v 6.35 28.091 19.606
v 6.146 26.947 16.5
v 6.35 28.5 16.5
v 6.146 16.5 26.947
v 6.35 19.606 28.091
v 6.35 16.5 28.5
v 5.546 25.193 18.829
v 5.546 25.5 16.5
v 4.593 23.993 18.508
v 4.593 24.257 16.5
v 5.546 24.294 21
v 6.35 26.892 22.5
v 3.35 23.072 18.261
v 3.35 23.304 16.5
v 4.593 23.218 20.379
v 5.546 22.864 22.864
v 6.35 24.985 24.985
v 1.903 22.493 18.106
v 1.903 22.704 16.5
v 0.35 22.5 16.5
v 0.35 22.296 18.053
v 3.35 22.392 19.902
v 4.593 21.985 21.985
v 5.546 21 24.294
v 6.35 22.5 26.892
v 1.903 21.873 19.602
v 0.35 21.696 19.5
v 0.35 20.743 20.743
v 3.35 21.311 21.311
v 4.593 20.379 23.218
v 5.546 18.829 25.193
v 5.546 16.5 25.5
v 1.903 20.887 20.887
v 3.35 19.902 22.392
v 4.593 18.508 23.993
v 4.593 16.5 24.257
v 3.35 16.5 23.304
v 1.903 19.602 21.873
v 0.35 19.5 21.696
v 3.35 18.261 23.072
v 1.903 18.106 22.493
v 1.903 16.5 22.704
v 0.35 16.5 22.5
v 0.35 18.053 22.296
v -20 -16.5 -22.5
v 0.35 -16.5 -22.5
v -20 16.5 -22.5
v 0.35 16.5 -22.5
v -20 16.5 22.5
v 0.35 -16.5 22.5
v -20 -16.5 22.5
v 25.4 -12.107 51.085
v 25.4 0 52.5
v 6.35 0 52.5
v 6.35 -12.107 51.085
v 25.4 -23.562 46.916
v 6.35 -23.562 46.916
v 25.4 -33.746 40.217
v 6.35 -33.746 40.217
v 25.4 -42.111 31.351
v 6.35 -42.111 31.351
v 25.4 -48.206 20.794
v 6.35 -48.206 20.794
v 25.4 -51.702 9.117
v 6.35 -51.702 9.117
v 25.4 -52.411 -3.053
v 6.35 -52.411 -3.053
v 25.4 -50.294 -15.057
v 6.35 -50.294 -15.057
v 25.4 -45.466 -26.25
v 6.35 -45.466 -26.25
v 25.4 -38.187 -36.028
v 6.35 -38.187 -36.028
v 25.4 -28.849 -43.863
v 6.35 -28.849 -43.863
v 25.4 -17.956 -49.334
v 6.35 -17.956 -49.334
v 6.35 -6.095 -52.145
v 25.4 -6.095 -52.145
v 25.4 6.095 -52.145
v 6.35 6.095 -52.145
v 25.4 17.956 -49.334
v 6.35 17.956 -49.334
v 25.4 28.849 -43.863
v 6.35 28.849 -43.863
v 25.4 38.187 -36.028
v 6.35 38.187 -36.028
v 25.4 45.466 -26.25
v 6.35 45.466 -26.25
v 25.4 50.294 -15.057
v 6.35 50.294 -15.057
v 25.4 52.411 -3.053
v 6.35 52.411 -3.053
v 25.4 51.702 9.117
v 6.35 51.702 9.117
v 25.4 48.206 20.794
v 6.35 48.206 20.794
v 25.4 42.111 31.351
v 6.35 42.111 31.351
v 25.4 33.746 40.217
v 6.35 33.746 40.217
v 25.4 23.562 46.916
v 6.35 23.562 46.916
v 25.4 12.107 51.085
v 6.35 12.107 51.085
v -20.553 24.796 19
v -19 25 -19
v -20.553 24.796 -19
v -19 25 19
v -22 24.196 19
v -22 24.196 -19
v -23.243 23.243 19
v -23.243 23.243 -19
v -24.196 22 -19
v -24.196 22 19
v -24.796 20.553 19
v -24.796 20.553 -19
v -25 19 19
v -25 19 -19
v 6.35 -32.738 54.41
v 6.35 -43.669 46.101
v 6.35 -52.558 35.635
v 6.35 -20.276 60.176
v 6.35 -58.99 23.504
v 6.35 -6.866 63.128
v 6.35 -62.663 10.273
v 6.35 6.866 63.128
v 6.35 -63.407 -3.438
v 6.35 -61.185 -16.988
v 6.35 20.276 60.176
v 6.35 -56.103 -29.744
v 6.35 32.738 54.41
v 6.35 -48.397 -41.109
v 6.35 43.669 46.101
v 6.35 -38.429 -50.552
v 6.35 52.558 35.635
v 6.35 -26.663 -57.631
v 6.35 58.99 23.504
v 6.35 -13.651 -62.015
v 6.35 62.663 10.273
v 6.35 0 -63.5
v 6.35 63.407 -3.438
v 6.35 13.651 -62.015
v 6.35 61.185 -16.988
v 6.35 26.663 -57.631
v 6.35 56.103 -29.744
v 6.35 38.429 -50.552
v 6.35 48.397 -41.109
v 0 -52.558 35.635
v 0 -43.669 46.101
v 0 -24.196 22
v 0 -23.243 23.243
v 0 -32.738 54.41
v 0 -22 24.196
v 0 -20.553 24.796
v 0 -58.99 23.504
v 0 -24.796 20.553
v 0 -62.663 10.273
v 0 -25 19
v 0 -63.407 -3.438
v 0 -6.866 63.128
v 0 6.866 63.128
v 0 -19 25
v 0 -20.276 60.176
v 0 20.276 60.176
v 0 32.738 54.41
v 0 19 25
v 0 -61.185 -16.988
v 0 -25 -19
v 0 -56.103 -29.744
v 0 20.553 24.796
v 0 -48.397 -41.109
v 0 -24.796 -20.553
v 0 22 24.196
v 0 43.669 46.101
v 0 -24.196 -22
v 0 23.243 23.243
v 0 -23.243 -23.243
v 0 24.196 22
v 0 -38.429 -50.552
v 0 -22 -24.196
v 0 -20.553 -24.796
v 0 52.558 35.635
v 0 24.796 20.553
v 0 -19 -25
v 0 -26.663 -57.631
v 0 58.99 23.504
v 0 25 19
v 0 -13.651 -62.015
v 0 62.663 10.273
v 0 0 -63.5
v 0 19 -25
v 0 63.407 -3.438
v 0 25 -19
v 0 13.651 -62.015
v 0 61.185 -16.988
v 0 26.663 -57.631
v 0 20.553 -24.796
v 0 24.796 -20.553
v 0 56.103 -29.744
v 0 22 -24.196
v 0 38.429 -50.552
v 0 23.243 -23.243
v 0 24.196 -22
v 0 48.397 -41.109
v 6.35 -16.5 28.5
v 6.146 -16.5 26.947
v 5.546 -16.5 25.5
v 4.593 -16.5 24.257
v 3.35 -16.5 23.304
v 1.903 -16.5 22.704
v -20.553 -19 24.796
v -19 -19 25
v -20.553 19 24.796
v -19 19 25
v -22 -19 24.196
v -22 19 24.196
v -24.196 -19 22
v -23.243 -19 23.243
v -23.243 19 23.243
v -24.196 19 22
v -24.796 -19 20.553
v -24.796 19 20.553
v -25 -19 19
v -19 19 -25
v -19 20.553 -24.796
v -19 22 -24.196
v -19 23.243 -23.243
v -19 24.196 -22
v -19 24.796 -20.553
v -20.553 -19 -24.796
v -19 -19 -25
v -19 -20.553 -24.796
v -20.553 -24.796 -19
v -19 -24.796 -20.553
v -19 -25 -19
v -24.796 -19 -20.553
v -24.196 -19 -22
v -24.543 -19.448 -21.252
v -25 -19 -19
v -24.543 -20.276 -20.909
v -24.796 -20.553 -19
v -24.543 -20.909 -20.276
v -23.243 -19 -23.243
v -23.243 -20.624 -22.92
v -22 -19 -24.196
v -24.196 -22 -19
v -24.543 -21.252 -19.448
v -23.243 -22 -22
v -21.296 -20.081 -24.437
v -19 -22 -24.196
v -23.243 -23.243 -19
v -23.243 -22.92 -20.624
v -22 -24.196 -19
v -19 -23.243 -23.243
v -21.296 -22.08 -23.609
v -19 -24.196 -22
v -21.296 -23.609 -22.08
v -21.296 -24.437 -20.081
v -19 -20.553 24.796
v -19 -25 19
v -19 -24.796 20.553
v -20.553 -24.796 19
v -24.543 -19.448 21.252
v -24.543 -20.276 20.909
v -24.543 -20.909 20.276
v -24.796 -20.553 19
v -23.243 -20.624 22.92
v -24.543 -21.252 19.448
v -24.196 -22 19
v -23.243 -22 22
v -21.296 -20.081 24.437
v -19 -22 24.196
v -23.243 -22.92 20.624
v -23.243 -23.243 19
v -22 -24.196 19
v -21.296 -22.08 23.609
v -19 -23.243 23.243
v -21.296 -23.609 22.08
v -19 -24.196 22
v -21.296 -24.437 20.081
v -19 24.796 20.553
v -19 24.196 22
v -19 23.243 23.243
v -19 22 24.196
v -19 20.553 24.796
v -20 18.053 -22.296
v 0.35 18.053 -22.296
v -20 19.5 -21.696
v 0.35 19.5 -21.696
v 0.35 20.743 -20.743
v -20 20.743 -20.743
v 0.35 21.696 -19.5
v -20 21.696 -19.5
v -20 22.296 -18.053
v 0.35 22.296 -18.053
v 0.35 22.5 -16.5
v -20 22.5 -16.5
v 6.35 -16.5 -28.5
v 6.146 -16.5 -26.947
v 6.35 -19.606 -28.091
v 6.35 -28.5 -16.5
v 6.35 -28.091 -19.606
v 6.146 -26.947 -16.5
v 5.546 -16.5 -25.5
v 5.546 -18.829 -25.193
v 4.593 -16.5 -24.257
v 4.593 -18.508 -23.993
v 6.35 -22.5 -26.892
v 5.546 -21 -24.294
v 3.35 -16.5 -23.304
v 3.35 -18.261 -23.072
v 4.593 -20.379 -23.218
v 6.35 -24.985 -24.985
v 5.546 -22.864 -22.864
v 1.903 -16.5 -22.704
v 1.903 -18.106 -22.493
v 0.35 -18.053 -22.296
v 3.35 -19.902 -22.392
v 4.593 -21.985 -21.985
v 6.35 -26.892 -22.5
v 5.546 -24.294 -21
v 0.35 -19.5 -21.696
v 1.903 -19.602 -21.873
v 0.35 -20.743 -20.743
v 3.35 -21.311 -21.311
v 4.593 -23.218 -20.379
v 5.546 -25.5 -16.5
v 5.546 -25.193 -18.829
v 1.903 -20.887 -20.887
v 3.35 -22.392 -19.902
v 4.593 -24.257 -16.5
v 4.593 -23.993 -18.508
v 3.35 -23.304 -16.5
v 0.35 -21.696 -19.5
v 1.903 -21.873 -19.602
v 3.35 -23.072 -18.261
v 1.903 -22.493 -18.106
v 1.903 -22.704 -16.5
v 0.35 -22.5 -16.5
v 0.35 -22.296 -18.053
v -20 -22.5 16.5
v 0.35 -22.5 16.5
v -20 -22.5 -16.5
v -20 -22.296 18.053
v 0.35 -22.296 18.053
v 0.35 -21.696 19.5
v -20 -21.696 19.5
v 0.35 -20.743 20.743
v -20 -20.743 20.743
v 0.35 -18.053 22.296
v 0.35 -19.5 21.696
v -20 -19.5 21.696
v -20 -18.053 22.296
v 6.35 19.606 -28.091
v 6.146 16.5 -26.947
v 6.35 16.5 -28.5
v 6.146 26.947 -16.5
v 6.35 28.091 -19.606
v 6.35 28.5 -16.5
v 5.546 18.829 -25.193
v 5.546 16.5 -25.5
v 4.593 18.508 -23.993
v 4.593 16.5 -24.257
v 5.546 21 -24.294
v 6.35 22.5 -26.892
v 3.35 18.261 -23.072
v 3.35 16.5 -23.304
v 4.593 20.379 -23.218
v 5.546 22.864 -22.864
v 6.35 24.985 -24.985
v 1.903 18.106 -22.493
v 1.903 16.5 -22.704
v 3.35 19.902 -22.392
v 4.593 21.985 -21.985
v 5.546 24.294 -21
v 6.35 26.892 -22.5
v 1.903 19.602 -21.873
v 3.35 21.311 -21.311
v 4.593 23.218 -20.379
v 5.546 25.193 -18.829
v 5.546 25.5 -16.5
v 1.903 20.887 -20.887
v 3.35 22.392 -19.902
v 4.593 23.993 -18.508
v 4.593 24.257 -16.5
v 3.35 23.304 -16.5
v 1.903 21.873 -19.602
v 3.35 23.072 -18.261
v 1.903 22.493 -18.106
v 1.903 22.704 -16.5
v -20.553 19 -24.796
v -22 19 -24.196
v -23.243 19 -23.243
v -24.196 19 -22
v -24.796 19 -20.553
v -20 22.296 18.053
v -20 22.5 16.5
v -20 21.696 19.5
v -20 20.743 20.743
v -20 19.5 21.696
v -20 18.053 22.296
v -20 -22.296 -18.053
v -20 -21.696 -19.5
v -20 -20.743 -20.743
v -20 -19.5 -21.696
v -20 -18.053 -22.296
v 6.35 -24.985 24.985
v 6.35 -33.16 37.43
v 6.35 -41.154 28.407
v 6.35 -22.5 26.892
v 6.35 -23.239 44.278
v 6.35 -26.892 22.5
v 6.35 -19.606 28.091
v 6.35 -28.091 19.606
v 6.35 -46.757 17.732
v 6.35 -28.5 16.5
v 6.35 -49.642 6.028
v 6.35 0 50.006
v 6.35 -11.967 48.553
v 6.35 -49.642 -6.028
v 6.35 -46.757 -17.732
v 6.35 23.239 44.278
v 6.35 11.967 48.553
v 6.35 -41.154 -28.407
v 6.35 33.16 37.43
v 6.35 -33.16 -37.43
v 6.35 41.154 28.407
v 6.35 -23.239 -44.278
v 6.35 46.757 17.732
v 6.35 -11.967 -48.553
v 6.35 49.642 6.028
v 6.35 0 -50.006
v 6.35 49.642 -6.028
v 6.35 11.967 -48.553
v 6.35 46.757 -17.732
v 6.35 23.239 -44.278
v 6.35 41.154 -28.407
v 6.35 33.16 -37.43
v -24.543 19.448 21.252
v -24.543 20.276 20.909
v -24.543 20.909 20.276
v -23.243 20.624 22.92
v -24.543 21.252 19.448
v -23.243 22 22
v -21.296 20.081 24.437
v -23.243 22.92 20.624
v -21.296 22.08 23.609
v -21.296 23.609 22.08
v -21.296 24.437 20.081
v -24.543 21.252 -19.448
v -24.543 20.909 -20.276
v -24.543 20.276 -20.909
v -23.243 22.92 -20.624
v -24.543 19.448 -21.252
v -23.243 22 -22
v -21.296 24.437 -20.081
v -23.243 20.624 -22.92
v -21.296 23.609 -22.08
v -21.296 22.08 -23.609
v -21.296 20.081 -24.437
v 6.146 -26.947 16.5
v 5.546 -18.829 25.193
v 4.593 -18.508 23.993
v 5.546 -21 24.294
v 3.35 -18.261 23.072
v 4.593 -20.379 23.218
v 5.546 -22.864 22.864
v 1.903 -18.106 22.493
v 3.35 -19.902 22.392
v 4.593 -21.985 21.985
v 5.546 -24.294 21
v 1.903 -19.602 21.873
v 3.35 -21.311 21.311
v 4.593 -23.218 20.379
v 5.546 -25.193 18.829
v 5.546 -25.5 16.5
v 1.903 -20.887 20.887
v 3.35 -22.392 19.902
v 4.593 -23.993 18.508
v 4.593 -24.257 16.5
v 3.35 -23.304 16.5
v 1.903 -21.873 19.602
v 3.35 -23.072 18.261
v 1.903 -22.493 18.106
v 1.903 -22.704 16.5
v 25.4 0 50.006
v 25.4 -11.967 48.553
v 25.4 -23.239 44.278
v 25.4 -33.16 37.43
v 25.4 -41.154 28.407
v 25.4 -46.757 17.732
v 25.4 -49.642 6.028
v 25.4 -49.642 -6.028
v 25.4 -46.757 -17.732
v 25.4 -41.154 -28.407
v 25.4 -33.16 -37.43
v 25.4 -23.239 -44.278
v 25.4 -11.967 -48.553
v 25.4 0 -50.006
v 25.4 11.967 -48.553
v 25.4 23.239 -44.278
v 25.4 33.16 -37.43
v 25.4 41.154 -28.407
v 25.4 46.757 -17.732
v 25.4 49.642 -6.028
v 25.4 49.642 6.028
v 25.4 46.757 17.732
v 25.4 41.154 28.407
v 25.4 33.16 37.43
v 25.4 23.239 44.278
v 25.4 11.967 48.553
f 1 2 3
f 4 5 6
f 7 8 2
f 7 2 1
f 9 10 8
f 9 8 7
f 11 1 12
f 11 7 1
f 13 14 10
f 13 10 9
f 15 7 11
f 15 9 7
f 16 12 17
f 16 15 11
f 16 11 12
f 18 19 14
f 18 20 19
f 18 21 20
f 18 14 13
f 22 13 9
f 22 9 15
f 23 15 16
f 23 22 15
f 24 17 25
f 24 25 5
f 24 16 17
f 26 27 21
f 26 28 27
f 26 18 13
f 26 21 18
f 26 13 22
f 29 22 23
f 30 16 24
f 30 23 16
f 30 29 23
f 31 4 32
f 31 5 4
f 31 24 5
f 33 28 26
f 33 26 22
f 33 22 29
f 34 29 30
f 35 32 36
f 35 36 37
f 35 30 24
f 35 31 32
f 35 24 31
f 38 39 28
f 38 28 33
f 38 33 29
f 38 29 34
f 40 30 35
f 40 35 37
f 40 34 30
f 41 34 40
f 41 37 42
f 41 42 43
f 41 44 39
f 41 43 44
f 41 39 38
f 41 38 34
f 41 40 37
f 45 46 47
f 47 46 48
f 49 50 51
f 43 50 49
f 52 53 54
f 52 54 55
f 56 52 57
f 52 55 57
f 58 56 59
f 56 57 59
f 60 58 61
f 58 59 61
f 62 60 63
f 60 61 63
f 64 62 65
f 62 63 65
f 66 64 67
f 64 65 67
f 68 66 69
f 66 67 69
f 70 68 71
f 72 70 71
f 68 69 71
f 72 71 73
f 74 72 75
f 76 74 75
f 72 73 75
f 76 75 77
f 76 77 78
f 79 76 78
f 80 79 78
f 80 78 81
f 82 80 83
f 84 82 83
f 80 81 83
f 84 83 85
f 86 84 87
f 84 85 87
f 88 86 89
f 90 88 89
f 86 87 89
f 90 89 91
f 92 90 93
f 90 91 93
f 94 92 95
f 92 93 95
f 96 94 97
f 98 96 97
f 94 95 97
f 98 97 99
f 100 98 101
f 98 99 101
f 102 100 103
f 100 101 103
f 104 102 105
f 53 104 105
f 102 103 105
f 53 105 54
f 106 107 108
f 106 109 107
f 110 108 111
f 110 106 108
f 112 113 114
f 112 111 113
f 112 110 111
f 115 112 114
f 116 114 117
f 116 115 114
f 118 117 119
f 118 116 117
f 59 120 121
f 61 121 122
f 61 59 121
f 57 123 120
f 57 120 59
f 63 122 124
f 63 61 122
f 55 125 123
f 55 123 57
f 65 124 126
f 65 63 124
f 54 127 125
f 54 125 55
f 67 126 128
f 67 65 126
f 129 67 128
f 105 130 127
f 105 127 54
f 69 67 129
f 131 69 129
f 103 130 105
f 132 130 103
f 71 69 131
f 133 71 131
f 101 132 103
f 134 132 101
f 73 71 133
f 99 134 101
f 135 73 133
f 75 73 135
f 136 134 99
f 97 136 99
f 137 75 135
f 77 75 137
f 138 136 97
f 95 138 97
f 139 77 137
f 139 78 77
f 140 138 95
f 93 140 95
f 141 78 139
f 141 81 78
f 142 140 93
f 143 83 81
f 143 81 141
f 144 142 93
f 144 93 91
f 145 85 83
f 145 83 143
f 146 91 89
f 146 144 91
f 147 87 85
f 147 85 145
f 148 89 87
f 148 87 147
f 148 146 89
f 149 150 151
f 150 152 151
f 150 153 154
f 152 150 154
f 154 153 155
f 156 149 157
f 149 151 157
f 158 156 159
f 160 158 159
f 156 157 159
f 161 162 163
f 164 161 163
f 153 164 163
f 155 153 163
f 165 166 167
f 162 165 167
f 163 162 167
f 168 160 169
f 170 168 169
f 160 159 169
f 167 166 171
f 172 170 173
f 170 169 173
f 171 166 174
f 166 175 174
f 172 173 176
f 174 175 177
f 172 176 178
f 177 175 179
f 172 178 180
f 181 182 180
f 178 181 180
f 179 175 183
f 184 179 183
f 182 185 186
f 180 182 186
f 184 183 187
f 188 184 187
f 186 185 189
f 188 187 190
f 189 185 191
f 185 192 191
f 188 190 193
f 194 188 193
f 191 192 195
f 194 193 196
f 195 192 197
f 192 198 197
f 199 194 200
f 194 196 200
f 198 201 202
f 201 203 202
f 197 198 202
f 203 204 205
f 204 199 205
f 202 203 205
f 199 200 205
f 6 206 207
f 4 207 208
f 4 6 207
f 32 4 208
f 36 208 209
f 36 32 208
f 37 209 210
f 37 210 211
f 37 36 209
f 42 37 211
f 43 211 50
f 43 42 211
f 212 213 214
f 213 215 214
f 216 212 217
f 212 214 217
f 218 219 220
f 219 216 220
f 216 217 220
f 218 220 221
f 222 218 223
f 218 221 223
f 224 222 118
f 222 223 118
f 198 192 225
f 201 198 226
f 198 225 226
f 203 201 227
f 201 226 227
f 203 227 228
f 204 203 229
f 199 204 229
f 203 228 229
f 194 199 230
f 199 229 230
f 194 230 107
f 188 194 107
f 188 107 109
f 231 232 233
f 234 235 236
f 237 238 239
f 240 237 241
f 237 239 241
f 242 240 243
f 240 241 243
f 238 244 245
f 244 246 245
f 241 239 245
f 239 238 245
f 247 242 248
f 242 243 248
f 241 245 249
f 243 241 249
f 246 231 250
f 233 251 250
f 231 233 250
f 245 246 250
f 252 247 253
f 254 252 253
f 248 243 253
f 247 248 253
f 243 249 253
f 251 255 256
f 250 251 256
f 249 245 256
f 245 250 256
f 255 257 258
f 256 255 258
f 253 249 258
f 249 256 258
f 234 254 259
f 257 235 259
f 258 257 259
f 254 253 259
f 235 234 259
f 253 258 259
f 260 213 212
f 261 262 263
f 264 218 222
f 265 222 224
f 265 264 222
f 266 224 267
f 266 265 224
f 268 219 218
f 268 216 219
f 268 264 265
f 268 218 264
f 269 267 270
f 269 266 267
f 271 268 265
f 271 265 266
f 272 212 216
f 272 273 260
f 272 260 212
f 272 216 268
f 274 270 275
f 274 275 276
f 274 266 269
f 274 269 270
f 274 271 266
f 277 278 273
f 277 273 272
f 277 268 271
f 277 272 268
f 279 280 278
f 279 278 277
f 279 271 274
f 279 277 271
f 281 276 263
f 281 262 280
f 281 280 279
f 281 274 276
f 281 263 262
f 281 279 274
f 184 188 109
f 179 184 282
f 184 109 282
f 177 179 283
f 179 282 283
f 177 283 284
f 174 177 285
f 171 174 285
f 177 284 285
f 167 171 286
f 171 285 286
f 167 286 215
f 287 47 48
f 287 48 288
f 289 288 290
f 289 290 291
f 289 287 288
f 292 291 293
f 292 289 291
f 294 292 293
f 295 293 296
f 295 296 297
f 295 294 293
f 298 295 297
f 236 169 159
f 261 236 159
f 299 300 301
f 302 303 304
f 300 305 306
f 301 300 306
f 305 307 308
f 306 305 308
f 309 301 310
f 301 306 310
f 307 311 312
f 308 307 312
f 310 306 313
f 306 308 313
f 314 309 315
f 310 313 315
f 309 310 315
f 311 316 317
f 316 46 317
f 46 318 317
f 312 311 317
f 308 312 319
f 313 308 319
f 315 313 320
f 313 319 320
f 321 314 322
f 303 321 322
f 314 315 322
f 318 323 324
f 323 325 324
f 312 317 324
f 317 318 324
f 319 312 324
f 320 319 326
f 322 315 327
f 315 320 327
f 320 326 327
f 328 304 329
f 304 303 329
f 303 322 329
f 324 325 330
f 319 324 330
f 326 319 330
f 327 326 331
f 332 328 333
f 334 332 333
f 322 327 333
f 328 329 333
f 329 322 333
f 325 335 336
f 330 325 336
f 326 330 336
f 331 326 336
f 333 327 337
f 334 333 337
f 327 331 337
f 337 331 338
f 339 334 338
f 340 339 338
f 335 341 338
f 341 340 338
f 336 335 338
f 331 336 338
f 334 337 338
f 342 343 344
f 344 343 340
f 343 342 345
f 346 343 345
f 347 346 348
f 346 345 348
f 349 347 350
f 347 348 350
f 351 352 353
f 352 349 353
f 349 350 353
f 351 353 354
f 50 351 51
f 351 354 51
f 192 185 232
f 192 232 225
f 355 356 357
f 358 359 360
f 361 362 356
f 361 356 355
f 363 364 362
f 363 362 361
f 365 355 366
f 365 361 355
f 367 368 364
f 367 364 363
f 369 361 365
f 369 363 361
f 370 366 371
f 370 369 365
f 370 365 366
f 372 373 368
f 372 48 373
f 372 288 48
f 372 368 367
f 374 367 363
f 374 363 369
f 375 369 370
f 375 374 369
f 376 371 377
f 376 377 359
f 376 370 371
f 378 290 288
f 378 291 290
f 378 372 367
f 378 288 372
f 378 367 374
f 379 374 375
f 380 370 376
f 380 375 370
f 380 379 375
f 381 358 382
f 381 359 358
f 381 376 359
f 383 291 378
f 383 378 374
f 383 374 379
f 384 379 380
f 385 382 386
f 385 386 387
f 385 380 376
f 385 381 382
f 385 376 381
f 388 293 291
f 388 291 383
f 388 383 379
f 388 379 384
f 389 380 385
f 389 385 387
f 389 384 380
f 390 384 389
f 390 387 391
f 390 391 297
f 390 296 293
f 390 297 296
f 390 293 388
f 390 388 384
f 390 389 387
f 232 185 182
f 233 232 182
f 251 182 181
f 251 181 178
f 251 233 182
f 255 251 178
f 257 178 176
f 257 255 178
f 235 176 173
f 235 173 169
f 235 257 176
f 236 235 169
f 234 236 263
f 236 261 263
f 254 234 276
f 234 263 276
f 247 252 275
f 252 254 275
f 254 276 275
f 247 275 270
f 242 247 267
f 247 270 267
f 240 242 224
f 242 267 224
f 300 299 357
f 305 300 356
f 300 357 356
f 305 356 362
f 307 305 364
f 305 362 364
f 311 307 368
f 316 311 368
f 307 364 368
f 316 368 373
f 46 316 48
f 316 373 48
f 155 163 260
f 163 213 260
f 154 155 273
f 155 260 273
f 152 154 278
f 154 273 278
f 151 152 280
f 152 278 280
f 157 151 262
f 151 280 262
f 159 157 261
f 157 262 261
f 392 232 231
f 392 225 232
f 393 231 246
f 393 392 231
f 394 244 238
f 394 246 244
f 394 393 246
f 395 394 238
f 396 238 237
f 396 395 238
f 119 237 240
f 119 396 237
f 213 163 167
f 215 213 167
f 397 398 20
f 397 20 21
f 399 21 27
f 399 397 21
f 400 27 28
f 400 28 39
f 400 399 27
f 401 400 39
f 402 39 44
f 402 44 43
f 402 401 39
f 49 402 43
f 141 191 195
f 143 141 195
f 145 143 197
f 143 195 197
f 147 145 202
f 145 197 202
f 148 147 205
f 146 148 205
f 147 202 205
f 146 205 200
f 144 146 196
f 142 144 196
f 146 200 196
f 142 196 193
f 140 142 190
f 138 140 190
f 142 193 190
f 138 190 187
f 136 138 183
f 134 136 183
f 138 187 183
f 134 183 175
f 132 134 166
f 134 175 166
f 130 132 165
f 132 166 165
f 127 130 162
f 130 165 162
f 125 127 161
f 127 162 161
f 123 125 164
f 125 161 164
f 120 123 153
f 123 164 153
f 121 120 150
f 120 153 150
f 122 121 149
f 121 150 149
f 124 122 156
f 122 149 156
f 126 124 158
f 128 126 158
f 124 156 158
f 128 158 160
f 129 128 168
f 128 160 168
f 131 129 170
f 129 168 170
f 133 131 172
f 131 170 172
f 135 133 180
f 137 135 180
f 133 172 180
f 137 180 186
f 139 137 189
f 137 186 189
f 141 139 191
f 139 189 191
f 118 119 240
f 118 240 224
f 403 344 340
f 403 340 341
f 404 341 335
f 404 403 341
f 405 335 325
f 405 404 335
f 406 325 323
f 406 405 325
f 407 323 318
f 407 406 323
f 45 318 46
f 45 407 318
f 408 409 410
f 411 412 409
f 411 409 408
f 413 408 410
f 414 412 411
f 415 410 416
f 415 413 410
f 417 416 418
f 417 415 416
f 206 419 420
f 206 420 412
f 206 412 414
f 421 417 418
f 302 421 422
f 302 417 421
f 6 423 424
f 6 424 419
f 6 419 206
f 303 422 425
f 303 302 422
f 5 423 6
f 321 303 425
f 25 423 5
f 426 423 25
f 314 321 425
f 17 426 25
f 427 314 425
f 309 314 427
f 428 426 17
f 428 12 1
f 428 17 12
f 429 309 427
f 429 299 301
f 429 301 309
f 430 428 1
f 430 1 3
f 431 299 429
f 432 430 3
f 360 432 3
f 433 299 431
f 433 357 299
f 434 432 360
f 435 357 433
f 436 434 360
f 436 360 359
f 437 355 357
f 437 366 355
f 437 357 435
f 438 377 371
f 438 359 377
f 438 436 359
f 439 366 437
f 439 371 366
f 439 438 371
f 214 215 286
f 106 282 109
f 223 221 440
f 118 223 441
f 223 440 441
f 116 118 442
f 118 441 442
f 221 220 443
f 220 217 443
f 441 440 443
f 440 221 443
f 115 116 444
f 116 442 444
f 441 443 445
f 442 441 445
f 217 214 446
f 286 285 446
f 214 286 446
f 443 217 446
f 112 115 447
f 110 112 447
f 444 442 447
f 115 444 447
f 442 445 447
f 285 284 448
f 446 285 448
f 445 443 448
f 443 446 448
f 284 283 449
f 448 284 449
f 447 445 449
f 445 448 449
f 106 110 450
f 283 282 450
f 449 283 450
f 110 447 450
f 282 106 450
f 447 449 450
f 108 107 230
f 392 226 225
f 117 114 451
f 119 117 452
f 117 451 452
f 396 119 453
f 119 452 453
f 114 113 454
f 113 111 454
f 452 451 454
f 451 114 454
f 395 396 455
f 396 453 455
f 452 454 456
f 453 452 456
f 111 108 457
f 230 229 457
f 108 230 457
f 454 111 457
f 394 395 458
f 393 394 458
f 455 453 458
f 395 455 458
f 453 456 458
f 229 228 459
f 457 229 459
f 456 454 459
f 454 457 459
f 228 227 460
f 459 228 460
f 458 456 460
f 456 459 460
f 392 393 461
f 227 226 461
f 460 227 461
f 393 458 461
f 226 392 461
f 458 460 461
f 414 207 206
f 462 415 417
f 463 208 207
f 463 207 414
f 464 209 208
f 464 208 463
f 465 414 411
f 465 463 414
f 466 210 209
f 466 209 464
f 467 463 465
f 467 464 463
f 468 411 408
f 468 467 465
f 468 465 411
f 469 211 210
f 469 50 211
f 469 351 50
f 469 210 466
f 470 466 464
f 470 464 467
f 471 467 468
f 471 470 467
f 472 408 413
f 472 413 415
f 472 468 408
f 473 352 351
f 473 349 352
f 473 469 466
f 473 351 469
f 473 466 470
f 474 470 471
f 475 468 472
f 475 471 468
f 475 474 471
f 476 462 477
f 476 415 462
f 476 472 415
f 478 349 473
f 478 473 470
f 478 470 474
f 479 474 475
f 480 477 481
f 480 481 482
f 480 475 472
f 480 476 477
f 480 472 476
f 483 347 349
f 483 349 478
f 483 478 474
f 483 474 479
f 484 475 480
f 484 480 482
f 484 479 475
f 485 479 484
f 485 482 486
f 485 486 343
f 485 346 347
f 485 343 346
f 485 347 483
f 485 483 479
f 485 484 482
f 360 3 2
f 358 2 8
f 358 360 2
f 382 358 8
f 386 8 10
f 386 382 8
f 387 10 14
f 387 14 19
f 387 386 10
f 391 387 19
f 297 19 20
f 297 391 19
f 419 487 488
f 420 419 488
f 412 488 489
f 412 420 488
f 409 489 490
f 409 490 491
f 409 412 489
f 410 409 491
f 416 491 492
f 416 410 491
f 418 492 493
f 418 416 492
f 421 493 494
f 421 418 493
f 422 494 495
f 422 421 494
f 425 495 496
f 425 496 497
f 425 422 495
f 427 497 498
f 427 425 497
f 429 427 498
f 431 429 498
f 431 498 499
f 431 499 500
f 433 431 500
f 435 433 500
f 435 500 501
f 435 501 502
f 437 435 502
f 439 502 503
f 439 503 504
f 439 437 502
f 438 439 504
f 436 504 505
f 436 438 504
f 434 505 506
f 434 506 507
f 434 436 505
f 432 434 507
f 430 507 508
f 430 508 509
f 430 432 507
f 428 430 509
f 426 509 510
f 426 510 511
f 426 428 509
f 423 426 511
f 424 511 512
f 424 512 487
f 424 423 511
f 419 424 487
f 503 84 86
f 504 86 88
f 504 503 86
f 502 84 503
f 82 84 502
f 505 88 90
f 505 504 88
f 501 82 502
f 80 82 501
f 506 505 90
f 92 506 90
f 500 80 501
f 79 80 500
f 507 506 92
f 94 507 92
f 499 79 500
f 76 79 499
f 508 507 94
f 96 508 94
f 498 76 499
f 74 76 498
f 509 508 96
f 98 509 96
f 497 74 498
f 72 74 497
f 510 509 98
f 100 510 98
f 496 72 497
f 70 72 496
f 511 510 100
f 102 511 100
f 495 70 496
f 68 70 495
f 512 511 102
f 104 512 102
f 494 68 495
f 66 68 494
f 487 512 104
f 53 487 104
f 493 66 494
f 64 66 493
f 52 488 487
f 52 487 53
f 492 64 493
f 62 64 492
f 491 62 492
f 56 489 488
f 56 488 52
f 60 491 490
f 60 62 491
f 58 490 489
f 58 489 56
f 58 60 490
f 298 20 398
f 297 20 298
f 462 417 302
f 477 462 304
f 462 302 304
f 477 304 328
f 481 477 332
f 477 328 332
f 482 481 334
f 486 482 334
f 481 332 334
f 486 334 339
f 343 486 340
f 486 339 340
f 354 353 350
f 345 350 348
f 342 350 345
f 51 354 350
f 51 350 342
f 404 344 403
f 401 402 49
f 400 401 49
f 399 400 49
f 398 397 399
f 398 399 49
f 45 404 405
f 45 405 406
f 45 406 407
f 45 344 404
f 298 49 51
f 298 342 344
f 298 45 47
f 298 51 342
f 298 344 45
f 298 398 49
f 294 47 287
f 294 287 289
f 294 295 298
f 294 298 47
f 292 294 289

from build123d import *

# Parameters (mm, degrees)
SKETCH1_R           = 63.5
BOSS_EXTRUDE1_DEPTH = 6.35
SKETCH2_R           = 52.5
SKETCH2_R_2         = 50.00625
BOSS_EXTRUDE2_DEPTH = 19.05
SKETCH3_W           = 50
SKETCH3_H           = 50
BOSS_EXTRUDE3_DEPTH = 25
SKETCH4_W           = 45
SKETCH4_H           = 45
CUT_EXTRUDE1_DEPTH  = 26.35
FILLET1_R           = 6


with BuildPart() as part:
    # Sketch1 → Boss-Extrude1 (new body)
    with BuildSketch(Plane(origin=(0, 0, 0), x_dir=(0, 0, -1), z_dir=(1, 0, 0))):
        Circle(SKETCH1_R)
    extrude(amount=BOSS_EXTRUDE1_DEPTH)

    # Sketch2 → Boss-Extrude2 (add)
    with BuildSketch(Plane(origin=(6.35, 0, 0), x_dir=(0, 0, -1), z_dir=(1, 0, 0))):
        with Locations(Location((0, 0, 0), (0, 0, 180))):
            Circle(SKETCH2_R)
        with Locations(Location((0, 0, 0), (0, 0, 180))):
            Circle(SKETCH2_R_2, mode=Mode.SUBTRACT)
    extrude(amount=BOSS_EXTRUDE2_DEPTH)

    # Sketch3 → Boss-Extrude3 (add)
    with BuildSketch(Plane.ZY):
        Rectangle(SKETCH3_W, SKETCH3_H)
    extrude(amount=BOSS_EXTRUDE3_DEPTH)

    # Sketch4 → Cut-Extrude1 (cut)
    with BuildSketch(Plane(origin=(6.35, 0, 0), x_dir=(0, 0, -1), z_dir=(1, 0, 0))):
        Rectangle(SKETCH4_W, SKETCH4_H)
    extrude(amount=-CUT_EXTRUDE1_DEPTH, mode=Mode.SUBTRACT)

    # Fillet1
    fillet1_edges = [part.edges().sort_by_distance(p)[0] for p in [
        (-12.5, -25, 25),
        (-12.5, 25, 25),
        (-12.5, 25, -25),
        (-12.5, -25, -25),
        (-25, 0, 25),
        (-25, 25, 0),
        (-25, 0, -25),
        (-25, -25, 0),
        (6.35, 0, -22.5),
        (6.35, 22.5, 0),
        (6.35, 0, 22.5),
        (6.35, -22.5, 0),
        (-6.825, 22.5, 22.5),
        (-6.825, -22.5, 22.5),
        (-6.825, -22.5, -22.5),
        (-6.825, 22.5, -22.5),
    ]]
    fillet(fillet1_edges, radius=FILLET1_R)


solid = part.part
